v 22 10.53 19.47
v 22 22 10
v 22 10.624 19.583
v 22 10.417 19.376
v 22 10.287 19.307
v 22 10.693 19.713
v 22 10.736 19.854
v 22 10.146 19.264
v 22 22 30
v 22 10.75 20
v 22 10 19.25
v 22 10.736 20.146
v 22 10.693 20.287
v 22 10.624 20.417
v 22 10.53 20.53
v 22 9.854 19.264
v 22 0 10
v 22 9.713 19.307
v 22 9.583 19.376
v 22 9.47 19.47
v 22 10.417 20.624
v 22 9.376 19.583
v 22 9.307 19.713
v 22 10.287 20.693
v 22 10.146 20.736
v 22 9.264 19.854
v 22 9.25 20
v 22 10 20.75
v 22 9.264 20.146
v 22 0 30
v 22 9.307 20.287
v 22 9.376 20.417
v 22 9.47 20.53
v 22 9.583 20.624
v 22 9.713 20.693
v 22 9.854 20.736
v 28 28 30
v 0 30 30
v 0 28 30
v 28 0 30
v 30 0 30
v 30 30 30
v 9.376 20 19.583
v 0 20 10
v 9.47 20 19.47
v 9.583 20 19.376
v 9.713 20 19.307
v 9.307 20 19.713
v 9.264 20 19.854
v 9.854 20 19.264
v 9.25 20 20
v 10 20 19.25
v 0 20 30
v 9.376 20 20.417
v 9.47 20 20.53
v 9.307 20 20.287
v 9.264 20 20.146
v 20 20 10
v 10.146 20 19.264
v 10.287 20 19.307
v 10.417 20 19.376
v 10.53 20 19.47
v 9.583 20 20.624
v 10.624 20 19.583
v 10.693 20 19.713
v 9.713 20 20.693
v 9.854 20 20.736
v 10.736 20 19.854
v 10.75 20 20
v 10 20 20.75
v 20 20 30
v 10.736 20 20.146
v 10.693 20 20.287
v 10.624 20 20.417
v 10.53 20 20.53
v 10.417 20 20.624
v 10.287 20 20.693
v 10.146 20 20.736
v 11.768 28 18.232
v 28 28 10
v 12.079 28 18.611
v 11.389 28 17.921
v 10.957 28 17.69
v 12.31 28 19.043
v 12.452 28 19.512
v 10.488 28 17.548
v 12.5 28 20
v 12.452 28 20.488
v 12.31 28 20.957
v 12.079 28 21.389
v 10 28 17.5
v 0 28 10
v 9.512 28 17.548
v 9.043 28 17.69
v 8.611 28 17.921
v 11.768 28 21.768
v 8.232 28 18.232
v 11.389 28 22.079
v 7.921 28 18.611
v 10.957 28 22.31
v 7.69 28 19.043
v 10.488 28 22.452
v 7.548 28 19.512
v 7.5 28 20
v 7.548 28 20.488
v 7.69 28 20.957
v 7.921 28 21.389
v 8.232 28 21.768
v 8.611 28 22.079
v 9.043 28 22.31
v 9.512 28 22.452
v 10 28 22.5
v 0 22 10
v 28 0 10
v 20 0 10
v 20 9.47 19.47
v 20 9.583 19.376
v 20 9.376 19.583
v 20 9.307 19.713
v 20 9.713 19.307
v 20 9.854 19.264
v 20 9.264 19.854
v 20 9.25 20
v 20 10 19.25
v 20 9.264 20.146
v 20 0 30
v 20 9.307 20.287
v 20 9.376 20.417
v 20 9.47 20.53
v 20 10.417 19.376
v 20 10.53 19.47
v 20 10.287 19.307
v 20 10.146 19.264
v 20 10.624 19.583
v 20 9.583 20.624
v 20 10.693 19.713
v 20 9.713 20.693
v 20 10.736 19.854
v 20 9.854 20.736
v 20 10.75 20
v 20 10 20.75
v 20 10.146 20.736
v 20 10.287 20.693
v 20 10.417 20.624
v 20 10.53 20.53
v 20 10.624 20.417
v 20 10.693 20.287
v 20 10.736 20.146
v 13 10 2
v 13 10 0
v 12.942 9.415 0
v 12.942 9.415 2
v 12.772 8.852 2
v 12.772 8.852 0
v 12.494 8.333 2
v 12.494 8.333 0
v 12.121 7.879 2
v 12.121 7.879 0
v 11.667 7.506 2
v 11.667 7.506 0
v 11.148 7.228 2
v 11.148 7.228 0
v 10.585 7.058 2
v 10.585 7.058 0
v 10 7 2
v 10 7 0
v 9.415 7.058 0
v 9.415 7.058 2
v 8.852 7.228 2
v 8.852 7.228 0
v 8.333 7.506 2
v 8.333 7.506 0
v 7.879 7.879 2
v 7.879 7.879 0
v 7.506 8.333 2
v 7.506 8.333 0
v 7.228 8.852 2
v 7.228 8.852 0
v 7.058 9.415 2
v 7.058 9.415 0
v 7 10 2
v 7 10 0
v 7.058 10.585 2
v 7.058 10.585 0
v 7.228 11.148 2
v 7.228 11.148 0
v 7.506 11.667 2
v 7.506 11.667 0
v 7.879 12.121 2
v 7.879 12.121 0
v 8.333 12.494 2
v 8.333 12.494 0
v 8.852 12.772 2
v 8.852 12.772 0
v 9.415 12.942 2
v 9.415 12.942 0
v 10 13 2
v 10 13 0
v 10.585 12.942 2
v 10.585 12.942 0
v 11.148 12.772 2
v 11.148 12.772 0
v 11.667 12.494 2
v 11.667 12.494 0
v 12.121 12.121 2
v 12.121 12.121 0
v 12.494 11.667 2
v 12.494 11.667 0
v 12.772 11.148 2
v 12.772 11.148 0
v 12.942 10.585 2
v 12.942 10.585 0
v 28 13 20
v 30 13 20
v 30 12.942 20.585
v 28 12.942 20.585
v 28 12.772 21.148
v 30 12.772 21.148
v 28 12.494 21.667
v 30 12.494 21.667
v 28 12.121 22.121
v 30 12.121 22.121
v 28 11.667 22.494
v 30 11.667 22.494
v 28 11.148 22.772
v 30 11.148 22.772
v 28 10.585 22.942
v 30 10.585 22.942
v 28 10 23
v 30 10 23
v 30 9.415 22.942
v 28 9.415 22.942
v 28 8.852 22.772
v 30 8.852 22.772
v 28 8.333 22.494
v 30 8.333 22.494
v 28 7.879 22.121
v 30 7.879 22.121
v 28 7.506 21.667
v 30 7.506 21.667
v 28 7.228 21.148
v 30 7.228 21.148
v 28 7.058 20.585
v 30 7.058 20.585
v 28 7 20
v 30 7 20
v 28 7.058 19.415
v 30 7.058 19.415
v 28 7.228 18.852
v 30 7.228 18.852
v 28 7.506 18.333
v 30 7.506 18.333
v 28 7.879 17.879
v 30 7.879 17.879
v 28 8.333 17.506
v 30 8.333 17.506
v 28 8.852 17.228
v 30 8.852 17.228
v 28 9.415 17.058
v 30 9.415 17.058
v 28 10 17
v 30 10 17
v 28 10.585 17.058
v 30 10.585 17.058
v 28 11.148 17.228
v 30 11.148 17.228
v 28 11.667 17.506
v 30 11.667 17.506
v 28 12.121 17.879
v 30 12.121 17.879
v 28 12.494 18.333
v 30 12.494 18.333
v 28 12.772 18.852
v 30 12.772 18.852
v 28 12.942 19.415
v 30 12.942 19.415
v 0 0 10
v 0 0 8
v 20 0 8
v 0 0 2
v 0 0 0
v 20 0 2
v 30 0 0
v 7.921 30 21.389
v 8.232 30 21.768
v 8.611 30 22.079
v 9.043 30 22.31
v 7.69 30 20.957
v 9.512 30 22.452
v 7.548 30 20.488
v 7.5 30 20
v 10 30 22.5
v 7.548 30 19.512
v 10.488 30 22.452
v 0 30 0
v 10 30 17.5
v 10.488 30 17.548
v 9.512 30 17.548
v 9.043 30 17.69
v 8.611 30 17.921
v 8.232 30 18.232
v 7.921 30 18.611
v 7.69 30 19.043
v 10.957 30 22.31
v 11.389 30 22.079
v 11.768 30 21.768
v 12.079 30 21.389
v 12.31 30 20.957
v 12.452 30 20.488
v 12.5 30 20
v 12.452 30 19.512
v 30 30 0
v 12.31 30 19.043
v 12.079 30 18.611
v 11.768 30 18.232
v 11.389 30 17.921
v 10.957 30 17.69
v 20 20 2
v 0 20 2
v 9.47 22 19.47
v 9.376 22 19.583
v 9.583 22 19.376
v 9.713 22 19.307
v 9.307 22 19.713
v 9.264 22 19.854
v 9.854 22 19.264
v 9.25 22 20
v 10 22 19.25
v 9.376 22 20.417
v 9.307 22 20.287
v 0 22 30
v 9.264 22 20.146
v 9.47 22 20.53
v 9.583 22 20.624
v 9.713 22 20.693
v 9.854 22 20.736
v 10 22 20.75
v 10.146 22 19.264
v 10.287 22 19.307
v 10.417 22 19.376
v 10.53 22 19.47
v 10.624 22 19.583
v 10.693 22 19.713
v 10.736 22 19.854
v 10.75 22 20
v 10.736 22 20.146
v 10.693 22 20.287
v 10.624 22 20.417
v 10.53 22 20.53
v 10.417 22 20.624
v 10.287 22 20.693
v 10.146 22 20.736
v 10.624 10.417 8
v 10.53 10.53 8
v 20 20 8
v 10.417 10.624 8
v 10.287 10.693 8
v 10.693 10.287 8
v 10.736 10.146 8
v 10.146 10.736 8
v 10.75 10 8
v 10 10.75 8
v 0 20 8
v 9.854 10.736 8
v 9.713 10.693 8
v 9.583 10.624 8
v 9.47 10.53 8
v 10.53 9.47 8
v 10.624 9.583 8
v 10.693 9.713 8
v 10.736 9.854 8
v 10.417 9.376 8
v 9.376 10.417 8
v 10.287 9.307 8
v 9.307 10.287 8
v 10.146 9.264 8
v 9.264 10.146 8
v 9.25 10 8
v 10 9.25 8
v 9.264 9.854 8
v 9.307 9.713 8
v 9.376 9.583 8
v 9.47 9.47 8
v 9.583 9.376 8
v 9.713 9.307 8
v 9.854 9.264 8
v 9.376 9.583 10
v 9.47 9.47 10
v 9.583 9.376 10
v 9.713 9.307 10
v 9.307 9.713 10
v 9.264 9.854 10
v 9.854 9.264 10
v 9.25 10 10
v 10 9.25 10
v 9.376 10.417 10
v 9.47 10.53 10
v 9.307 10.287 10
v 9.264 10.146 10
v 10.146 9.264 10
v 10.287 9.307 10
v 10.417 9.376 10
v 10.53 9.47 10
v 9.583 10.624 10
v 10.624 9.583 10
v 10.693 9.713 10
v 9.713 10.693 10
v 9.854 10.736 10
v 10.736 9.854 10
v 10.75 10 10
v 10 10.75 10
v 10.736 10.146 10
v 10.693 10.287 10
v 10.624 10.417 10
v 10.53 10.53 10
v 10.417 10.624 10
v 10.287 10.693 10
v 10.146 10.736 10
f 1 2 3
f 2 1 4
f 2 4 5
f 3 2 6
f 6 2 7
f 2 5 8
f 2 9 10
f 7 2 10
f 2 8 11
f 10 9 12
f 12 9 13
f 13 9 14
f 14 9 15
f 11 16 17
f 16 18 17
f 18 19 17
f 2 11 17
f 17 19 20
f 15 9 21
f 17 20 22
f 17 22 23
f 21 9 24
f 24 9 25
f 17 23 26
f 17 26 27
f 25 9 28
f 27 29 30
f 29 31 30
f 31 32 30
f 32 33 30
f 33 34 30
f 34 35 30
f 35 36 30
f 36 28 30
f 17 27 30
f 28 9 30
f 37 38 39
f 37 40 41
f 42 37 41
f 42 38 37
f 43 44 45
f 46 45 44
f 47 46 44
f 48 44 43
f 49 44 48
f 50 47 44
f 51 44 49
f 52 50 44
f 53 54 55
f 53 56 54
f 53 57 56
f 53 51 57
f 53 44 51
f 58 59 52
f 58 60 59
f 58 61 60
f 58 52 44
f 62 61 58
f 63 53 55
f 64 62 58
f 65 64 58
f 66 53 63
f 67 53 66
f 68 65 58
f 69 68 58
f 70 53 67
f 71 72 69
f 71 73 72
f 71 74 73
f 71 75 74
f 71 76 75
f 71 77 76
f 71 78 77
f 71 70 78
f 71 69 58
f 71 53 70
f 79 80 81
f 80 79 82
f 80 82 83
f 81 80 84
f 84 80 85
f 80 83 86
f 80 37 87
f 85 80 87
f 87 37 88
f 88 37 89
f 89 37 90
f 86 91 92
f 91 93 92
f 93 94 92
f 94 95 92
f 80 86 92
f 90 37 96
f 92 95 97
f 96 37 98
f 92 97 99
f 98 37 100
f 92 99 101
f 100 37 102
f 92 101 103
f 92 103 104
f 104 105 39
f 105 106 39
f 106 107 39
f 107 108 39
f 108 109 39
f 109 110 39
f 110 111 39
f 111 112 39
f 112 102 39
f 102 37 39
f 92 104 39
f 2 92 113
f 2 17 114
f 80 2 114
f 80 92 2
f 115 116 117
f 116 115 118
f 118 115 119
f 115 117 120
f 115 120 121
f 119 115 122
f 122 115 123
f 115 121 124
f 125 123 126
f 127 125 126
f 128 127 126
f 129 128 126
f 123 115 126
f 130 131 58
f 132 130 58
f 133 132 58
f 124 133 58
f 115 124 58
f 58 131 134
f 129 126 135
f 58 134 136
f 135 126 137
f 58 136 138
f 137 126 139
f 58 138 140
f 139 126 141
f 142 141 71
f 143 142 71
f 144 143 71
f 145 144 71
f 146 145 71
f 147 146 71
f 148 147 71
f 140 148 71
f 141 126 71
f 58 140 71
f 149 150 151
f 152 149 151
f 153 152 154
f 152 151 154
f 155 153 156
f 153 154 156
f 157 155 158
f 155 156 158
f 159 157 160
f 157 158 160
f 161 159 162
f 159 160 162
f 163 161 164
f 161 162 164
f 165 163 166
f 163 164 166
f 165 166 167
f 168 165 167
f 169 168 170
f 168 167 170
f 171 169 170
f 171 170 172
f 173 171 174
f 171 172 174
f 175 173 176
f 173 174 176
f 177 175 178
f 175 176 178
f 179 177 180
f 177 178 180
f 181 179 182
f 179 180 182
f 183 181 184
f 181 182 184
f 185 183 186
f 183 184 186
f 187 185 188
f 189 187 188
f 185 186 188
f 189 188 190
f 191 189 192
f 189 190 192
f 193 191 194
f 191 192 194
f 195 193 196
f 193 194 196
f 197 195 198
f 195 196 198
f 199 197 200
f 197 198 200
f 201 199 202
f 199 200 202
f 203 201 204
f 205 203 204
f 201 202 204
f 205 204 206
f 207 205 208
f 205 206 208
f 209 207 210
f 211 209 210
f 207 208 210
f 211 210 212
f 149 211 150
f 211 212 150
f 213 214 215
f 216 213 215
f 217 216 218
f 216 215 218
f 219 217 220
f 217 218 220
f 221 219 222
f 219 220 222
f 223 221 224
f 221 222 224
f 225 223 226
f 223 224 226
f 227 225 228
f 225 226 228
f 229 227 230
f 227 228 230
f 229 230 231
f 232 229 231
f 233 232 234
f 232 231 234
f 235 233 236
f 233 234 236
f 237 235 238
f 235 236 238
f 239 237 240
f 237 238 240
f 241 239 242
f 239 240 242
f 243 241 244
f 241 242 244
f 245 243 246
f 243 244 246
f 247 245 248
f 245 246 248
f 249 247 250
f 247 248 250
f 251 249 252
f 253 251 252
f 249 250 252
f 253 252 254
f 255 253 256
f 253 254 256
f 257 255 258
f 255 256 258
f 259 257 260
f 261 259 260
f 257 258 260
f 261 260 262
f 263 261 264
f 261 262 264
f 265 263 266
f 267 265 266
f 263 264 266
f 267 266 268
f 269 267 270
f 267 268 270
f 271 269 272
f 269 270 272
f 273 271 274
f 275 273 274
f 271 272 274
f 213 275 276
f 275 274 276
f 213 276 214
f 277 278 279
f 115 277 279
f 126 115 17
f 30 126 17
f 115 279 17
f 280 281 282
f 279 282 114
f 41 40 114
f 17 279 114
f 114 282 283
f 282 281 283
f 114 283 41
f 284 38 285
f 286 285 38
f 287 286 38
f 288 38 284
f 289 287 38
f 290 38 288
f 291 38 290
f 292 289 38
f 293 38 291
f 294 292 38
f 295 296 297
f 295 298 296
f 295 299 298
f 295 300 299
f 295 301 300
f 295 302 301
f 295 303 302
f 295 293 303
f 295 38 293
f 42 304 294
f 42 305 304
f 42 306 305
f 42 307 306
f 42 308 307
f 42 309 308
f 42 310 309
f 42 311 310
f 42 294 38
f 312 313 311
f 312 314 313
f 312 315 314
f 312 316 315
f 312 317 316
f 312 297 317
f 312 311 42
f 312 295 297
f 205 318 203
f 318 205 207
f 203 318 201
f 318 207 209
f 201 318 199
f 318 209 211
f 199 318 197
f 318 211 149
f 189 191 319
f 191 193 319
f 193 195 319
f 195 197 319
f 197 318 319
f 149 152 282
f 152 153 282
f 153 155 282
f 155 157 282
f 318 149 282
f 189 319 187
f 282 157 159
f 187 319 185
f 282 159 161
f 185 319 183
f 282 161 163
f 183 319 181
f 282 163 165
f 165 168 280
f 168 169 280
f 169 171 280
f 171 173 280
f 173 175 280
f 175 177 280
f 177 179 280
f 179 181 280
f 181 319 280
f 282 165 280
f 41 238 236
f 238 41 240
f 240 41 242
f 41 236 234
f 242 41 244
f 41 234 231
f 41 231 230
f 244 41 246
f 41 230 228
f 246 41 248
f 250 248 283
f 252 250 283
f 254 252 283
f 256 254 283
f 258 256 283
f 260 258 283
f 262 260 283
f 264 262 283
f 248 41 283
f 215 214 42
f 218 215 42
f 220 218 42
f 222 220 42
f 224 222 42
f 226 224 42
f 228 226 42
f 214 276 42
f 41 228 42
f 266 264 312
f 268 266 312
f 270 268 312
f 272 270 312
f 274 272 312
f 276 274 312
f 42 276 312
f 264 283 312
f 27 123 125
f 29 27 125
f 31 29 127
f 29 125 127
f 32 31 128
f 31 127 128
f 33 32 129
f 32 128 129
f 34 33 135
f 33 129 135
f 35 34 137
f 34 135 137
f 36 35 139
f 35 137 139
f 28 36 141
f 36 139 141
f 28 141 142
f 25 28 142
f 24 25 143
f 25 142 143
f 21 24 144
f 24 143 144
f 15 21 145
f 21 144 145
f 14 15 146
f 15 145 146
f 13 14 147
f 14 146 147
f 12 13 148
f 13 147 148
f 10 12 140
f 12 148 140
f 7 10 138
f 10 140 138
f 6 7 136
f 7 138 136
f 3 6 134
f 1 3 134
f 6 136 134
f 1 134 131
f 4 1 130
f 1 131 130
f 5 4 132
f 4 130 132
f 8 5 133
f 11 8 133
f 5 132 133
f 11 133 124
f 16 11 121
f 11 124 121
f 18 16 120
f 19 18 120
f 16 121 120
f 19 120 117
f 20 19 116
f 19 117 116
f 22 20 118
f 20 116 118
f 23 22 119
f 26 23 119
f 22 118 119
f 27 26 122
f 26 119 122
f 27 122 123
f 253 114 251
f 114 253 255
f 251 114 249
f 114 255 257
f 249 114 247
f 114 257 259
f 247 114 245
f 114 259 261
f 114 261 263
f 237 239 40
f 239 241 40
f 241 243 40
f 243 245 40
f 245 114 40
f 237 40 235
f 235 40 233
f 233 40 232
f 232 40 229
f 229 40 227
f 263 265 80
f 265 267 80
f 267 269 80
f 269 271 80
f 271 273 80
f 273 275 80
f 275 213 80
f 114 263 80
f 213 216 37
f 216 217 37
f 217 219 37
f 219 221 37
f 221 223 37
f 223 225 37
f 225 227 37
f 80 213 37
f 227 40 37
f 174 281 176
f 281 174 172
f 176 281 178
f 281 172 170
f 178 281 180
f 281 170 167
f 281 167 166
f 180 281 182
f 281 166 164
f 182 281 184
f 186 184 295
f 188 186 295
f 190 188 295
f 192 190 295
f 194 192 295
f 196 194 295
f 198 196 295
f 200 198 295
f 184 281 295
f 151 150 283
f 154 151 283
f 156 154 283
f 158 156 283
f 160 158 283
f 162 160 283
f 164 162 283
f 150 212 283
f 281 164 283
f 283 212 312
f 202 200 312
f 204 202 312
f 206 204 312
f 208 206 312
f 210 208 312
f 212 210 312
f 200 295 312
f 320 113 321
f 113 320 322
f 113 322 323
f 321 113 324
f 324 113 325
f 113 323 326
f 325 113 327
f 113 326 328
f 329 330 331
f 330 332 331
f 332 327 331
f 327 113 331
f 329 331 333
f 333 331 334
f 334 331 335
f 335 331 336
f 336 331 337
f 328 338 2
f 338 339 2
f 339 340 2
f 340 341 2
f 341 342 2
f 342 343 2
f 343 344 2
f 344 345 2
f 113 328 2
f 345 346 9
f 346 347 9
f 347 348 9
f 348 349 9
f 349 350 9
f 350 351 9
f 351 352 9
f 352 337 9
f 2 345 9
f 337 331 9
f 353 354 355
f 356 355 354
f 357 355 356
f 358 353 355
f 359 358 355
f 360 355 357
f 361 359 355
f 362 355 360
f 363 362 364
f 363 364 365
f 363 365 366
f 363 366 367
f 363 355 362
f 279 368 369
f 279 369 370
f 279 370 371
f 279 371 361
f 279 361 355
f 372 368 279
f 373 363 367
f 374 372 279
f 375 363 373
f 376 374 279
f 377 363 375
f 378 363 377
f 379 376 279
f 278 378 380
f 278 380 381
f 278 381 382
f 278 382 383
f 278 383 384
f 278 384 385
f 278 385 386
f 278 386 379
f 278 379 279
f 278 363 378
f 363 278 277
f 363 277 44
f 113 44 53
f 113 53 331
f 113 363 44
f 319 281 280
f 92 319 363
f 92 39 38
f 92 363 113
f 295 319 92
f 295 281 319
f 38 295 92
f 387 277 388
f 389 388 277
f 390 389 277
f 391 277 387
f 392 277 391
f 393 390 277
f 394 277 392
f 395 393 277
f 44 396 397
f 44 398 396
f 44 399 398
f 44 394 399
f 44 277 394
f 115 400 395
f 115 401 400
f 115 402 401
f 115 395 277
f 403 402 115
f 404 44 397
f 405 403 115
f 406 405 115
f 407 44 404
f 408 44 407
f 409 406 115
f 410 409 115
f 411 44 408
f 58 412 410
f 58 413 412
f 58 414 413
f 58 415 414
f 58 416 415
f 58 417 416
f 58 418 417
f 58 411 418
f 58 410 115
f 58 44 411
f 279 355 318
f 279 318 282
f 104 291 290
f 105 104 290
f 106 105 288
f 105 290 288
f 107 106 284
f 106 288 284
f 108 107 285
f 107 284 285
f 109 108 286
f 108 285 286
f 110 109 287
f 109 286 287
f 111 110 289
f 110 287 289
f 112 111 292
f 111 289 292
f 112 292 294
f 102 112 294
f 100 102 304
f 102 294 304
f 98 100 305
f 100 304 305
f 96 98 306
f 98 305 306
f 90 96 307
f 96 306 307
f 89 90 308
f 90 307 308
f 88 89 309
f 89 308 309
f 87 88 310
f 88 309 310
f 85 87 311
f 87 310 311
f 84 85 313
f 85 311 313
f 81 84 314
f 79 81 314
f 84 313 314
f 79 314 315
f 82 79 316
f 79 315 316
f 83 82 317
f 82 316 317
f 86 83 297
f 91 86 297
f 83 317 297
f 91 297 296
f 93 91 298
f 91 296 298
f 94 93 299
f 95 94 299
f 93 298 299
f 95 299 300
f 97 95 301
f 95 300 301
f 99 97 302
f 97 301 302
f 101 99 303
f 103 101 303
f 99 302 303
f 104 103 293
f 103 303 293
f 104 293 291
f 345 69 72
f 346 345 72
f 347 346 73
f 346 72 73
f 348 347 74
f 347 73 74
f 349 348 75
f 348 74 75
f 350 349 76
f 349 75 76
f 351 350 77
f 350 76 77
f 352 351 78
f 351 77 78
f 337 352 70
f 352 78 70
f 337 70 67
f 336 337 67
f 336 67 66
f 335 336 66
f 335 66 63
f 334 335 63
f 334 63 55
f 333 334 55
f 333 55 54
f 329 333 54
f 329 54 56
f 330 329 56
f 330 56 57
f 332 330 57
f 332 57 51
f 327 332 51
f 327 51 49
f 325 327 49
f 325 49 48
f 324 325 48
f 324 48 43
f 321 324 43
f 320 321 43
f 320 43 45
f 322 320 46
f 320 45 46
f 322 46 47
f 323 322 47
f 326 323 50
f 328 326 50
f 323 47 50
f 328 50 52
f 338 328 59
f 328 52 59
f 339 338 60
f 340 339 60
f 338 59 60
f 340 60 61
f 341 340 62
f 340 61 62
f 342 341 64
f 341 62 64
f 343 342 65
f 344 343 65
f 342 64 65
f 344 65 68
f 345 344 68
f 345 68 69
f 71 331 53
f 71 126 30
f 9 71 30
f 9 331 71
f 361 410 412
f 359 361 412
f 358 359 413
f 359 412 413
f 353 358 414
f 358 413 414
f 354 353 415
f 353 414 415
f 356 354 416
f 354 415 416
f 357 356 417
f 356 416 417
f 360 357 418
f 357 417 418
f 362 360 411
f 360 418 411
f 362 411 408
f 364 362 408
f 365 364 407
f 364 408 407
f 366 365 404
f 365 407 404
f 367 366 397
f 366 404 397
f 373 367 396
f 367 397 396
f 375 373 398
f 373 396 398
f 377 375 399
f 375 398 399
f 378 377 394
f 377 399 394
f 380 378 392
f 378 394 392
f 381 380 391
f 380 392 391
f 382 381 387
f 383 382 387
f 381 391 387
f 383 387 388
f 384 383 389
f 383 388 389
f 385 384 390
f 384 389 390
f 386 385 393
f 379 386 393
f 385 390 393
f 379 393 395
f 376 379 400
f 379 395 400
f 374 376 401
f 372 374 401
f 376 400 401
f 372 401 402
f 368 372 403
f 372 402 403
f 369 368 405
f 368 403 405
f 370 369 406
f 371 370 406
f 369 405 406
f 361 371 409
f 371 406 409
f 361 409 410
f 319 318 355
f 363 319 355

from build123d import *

# Parameters (mm, degrees)
F0_W      = 30
F0_H      = 30
F1_DEPTH  = 30
F2_W      = 20
F2_H      = 20
F3_DEPTH  = 20
F5_DEPTH  = 20
F6_W      = 20
F6_H      = 6
F7_DEPTH  = 20
F8_R      = 2.5
F9_DEPTH  = 2
F10_R     = 0.75
F11_DEPTH = 25
F12_R     = 3
F13_DEPTH = 2
F14_R     = 0.75
F15_DEPTH = 2
F16_R     = 0.75
F17_DEPTH = 2
F18_R     = 3
F19_DEPTH = 2


with BuildPart() as f1:
    # F0 (on Top) → F1 (new body)
    with BuildSketch(Plane.XY):
        with Locations((15, 15)):
            Rectangle(F0_W, F0_H)
    extrude(amount=F1_DEPTH)

    # F2 (on face) → F3 (cut)
    with BuildSketch(Plane.XY.offset(30)):
        with Locations((10, 10)):
            Rectangle(F2_W, F2_H)
    extrude(amount=-F3_DEPTH, mode=Mode.SUBTRACT)

    # F4 (on face) → F5 (cut)
    with BuildSketch(Plane.XY.offset(30)):
        Polygon((28, 28), (0, 28), (0, 22), (22, 22), (22, 0), (28, 0), (28, 22), align=None)
    extrude(amount=-F5_DEPTH, mode=Mode.SUBTRACT)

    # F6 (on face) → F7 (cut)
    with BuildSketch(Plane(origin=(0, 0, 0), x_dir=(0, -1, 0), z_dir=(-1, 0, 0))):
        with Locations((-10, 5)):
            Rectangle(F6_W, F6_H)
    extrude(amount=-F7_DEPTH, mode=Mode.SUBTRACT)

    # F8 (on face) → F9 (cut, through all)
    with BuildSketch(Plane(origin=(0, 30, 0), x_dir=(-1, 0, 0), z_dir=(0, 1, 0))):
        with Locations((-10, 20)):
            Circle(F8_R)
    extrude(amount=-F9_DEPTH, mode=Mode.SUBTRACT)

    # F10 (on face) → F11 (cut)
    with BuildSketch(Plane.XZ.offset(-20)):
        with Locations((10, 20)):
            Circle(F10_R)
    extrude(amount=-F11_DEPTH, mode=Mode.SUBTRACT)

    # F12 (on face) → F13 (cut, through all)
    with BuildSketch(Plane.YZ.offset(30)):
        with Locations((10, 20)):
            Circle(F12_R)
    extrude(amount=-F13_DEPTH, mode=Mode.SUBTRACT)

    # F14 (on face) → F15 (cut, through all)
    with BuildSketch(Plane(origin=(20, 0, 0), x_dir=(0, -1, 0), z_dir=(-1, 0, 0))):
        with Locations((-10, 20)):
            Circle(F14_R)
    extrude(amount=-F15_DEPTH, mode=Mode.SUBTRACT)

    # F16 (on face) → F17 (cut, through all)
    with BuildSketch(Plane.XY.offset(10)):
        with Locations((10, 10)):
            Circle(F16_R)
    extrude(amount=-F17_DEPTH, mode=Mode.SUBTRACT)

    # F18 (on face) → F19 (cut, through all)
    with BuildSketch(Plane(origin=(0, 0, 0), x_dir=(1, 0, 0), z_dir=(0, 0, -1))):
        with Locations((10, -10)):
            Circle(F18_R)
    extrude(amount=-F19_DEPTH, mode=Mode.SUBTRACT)


solid = f1.part
